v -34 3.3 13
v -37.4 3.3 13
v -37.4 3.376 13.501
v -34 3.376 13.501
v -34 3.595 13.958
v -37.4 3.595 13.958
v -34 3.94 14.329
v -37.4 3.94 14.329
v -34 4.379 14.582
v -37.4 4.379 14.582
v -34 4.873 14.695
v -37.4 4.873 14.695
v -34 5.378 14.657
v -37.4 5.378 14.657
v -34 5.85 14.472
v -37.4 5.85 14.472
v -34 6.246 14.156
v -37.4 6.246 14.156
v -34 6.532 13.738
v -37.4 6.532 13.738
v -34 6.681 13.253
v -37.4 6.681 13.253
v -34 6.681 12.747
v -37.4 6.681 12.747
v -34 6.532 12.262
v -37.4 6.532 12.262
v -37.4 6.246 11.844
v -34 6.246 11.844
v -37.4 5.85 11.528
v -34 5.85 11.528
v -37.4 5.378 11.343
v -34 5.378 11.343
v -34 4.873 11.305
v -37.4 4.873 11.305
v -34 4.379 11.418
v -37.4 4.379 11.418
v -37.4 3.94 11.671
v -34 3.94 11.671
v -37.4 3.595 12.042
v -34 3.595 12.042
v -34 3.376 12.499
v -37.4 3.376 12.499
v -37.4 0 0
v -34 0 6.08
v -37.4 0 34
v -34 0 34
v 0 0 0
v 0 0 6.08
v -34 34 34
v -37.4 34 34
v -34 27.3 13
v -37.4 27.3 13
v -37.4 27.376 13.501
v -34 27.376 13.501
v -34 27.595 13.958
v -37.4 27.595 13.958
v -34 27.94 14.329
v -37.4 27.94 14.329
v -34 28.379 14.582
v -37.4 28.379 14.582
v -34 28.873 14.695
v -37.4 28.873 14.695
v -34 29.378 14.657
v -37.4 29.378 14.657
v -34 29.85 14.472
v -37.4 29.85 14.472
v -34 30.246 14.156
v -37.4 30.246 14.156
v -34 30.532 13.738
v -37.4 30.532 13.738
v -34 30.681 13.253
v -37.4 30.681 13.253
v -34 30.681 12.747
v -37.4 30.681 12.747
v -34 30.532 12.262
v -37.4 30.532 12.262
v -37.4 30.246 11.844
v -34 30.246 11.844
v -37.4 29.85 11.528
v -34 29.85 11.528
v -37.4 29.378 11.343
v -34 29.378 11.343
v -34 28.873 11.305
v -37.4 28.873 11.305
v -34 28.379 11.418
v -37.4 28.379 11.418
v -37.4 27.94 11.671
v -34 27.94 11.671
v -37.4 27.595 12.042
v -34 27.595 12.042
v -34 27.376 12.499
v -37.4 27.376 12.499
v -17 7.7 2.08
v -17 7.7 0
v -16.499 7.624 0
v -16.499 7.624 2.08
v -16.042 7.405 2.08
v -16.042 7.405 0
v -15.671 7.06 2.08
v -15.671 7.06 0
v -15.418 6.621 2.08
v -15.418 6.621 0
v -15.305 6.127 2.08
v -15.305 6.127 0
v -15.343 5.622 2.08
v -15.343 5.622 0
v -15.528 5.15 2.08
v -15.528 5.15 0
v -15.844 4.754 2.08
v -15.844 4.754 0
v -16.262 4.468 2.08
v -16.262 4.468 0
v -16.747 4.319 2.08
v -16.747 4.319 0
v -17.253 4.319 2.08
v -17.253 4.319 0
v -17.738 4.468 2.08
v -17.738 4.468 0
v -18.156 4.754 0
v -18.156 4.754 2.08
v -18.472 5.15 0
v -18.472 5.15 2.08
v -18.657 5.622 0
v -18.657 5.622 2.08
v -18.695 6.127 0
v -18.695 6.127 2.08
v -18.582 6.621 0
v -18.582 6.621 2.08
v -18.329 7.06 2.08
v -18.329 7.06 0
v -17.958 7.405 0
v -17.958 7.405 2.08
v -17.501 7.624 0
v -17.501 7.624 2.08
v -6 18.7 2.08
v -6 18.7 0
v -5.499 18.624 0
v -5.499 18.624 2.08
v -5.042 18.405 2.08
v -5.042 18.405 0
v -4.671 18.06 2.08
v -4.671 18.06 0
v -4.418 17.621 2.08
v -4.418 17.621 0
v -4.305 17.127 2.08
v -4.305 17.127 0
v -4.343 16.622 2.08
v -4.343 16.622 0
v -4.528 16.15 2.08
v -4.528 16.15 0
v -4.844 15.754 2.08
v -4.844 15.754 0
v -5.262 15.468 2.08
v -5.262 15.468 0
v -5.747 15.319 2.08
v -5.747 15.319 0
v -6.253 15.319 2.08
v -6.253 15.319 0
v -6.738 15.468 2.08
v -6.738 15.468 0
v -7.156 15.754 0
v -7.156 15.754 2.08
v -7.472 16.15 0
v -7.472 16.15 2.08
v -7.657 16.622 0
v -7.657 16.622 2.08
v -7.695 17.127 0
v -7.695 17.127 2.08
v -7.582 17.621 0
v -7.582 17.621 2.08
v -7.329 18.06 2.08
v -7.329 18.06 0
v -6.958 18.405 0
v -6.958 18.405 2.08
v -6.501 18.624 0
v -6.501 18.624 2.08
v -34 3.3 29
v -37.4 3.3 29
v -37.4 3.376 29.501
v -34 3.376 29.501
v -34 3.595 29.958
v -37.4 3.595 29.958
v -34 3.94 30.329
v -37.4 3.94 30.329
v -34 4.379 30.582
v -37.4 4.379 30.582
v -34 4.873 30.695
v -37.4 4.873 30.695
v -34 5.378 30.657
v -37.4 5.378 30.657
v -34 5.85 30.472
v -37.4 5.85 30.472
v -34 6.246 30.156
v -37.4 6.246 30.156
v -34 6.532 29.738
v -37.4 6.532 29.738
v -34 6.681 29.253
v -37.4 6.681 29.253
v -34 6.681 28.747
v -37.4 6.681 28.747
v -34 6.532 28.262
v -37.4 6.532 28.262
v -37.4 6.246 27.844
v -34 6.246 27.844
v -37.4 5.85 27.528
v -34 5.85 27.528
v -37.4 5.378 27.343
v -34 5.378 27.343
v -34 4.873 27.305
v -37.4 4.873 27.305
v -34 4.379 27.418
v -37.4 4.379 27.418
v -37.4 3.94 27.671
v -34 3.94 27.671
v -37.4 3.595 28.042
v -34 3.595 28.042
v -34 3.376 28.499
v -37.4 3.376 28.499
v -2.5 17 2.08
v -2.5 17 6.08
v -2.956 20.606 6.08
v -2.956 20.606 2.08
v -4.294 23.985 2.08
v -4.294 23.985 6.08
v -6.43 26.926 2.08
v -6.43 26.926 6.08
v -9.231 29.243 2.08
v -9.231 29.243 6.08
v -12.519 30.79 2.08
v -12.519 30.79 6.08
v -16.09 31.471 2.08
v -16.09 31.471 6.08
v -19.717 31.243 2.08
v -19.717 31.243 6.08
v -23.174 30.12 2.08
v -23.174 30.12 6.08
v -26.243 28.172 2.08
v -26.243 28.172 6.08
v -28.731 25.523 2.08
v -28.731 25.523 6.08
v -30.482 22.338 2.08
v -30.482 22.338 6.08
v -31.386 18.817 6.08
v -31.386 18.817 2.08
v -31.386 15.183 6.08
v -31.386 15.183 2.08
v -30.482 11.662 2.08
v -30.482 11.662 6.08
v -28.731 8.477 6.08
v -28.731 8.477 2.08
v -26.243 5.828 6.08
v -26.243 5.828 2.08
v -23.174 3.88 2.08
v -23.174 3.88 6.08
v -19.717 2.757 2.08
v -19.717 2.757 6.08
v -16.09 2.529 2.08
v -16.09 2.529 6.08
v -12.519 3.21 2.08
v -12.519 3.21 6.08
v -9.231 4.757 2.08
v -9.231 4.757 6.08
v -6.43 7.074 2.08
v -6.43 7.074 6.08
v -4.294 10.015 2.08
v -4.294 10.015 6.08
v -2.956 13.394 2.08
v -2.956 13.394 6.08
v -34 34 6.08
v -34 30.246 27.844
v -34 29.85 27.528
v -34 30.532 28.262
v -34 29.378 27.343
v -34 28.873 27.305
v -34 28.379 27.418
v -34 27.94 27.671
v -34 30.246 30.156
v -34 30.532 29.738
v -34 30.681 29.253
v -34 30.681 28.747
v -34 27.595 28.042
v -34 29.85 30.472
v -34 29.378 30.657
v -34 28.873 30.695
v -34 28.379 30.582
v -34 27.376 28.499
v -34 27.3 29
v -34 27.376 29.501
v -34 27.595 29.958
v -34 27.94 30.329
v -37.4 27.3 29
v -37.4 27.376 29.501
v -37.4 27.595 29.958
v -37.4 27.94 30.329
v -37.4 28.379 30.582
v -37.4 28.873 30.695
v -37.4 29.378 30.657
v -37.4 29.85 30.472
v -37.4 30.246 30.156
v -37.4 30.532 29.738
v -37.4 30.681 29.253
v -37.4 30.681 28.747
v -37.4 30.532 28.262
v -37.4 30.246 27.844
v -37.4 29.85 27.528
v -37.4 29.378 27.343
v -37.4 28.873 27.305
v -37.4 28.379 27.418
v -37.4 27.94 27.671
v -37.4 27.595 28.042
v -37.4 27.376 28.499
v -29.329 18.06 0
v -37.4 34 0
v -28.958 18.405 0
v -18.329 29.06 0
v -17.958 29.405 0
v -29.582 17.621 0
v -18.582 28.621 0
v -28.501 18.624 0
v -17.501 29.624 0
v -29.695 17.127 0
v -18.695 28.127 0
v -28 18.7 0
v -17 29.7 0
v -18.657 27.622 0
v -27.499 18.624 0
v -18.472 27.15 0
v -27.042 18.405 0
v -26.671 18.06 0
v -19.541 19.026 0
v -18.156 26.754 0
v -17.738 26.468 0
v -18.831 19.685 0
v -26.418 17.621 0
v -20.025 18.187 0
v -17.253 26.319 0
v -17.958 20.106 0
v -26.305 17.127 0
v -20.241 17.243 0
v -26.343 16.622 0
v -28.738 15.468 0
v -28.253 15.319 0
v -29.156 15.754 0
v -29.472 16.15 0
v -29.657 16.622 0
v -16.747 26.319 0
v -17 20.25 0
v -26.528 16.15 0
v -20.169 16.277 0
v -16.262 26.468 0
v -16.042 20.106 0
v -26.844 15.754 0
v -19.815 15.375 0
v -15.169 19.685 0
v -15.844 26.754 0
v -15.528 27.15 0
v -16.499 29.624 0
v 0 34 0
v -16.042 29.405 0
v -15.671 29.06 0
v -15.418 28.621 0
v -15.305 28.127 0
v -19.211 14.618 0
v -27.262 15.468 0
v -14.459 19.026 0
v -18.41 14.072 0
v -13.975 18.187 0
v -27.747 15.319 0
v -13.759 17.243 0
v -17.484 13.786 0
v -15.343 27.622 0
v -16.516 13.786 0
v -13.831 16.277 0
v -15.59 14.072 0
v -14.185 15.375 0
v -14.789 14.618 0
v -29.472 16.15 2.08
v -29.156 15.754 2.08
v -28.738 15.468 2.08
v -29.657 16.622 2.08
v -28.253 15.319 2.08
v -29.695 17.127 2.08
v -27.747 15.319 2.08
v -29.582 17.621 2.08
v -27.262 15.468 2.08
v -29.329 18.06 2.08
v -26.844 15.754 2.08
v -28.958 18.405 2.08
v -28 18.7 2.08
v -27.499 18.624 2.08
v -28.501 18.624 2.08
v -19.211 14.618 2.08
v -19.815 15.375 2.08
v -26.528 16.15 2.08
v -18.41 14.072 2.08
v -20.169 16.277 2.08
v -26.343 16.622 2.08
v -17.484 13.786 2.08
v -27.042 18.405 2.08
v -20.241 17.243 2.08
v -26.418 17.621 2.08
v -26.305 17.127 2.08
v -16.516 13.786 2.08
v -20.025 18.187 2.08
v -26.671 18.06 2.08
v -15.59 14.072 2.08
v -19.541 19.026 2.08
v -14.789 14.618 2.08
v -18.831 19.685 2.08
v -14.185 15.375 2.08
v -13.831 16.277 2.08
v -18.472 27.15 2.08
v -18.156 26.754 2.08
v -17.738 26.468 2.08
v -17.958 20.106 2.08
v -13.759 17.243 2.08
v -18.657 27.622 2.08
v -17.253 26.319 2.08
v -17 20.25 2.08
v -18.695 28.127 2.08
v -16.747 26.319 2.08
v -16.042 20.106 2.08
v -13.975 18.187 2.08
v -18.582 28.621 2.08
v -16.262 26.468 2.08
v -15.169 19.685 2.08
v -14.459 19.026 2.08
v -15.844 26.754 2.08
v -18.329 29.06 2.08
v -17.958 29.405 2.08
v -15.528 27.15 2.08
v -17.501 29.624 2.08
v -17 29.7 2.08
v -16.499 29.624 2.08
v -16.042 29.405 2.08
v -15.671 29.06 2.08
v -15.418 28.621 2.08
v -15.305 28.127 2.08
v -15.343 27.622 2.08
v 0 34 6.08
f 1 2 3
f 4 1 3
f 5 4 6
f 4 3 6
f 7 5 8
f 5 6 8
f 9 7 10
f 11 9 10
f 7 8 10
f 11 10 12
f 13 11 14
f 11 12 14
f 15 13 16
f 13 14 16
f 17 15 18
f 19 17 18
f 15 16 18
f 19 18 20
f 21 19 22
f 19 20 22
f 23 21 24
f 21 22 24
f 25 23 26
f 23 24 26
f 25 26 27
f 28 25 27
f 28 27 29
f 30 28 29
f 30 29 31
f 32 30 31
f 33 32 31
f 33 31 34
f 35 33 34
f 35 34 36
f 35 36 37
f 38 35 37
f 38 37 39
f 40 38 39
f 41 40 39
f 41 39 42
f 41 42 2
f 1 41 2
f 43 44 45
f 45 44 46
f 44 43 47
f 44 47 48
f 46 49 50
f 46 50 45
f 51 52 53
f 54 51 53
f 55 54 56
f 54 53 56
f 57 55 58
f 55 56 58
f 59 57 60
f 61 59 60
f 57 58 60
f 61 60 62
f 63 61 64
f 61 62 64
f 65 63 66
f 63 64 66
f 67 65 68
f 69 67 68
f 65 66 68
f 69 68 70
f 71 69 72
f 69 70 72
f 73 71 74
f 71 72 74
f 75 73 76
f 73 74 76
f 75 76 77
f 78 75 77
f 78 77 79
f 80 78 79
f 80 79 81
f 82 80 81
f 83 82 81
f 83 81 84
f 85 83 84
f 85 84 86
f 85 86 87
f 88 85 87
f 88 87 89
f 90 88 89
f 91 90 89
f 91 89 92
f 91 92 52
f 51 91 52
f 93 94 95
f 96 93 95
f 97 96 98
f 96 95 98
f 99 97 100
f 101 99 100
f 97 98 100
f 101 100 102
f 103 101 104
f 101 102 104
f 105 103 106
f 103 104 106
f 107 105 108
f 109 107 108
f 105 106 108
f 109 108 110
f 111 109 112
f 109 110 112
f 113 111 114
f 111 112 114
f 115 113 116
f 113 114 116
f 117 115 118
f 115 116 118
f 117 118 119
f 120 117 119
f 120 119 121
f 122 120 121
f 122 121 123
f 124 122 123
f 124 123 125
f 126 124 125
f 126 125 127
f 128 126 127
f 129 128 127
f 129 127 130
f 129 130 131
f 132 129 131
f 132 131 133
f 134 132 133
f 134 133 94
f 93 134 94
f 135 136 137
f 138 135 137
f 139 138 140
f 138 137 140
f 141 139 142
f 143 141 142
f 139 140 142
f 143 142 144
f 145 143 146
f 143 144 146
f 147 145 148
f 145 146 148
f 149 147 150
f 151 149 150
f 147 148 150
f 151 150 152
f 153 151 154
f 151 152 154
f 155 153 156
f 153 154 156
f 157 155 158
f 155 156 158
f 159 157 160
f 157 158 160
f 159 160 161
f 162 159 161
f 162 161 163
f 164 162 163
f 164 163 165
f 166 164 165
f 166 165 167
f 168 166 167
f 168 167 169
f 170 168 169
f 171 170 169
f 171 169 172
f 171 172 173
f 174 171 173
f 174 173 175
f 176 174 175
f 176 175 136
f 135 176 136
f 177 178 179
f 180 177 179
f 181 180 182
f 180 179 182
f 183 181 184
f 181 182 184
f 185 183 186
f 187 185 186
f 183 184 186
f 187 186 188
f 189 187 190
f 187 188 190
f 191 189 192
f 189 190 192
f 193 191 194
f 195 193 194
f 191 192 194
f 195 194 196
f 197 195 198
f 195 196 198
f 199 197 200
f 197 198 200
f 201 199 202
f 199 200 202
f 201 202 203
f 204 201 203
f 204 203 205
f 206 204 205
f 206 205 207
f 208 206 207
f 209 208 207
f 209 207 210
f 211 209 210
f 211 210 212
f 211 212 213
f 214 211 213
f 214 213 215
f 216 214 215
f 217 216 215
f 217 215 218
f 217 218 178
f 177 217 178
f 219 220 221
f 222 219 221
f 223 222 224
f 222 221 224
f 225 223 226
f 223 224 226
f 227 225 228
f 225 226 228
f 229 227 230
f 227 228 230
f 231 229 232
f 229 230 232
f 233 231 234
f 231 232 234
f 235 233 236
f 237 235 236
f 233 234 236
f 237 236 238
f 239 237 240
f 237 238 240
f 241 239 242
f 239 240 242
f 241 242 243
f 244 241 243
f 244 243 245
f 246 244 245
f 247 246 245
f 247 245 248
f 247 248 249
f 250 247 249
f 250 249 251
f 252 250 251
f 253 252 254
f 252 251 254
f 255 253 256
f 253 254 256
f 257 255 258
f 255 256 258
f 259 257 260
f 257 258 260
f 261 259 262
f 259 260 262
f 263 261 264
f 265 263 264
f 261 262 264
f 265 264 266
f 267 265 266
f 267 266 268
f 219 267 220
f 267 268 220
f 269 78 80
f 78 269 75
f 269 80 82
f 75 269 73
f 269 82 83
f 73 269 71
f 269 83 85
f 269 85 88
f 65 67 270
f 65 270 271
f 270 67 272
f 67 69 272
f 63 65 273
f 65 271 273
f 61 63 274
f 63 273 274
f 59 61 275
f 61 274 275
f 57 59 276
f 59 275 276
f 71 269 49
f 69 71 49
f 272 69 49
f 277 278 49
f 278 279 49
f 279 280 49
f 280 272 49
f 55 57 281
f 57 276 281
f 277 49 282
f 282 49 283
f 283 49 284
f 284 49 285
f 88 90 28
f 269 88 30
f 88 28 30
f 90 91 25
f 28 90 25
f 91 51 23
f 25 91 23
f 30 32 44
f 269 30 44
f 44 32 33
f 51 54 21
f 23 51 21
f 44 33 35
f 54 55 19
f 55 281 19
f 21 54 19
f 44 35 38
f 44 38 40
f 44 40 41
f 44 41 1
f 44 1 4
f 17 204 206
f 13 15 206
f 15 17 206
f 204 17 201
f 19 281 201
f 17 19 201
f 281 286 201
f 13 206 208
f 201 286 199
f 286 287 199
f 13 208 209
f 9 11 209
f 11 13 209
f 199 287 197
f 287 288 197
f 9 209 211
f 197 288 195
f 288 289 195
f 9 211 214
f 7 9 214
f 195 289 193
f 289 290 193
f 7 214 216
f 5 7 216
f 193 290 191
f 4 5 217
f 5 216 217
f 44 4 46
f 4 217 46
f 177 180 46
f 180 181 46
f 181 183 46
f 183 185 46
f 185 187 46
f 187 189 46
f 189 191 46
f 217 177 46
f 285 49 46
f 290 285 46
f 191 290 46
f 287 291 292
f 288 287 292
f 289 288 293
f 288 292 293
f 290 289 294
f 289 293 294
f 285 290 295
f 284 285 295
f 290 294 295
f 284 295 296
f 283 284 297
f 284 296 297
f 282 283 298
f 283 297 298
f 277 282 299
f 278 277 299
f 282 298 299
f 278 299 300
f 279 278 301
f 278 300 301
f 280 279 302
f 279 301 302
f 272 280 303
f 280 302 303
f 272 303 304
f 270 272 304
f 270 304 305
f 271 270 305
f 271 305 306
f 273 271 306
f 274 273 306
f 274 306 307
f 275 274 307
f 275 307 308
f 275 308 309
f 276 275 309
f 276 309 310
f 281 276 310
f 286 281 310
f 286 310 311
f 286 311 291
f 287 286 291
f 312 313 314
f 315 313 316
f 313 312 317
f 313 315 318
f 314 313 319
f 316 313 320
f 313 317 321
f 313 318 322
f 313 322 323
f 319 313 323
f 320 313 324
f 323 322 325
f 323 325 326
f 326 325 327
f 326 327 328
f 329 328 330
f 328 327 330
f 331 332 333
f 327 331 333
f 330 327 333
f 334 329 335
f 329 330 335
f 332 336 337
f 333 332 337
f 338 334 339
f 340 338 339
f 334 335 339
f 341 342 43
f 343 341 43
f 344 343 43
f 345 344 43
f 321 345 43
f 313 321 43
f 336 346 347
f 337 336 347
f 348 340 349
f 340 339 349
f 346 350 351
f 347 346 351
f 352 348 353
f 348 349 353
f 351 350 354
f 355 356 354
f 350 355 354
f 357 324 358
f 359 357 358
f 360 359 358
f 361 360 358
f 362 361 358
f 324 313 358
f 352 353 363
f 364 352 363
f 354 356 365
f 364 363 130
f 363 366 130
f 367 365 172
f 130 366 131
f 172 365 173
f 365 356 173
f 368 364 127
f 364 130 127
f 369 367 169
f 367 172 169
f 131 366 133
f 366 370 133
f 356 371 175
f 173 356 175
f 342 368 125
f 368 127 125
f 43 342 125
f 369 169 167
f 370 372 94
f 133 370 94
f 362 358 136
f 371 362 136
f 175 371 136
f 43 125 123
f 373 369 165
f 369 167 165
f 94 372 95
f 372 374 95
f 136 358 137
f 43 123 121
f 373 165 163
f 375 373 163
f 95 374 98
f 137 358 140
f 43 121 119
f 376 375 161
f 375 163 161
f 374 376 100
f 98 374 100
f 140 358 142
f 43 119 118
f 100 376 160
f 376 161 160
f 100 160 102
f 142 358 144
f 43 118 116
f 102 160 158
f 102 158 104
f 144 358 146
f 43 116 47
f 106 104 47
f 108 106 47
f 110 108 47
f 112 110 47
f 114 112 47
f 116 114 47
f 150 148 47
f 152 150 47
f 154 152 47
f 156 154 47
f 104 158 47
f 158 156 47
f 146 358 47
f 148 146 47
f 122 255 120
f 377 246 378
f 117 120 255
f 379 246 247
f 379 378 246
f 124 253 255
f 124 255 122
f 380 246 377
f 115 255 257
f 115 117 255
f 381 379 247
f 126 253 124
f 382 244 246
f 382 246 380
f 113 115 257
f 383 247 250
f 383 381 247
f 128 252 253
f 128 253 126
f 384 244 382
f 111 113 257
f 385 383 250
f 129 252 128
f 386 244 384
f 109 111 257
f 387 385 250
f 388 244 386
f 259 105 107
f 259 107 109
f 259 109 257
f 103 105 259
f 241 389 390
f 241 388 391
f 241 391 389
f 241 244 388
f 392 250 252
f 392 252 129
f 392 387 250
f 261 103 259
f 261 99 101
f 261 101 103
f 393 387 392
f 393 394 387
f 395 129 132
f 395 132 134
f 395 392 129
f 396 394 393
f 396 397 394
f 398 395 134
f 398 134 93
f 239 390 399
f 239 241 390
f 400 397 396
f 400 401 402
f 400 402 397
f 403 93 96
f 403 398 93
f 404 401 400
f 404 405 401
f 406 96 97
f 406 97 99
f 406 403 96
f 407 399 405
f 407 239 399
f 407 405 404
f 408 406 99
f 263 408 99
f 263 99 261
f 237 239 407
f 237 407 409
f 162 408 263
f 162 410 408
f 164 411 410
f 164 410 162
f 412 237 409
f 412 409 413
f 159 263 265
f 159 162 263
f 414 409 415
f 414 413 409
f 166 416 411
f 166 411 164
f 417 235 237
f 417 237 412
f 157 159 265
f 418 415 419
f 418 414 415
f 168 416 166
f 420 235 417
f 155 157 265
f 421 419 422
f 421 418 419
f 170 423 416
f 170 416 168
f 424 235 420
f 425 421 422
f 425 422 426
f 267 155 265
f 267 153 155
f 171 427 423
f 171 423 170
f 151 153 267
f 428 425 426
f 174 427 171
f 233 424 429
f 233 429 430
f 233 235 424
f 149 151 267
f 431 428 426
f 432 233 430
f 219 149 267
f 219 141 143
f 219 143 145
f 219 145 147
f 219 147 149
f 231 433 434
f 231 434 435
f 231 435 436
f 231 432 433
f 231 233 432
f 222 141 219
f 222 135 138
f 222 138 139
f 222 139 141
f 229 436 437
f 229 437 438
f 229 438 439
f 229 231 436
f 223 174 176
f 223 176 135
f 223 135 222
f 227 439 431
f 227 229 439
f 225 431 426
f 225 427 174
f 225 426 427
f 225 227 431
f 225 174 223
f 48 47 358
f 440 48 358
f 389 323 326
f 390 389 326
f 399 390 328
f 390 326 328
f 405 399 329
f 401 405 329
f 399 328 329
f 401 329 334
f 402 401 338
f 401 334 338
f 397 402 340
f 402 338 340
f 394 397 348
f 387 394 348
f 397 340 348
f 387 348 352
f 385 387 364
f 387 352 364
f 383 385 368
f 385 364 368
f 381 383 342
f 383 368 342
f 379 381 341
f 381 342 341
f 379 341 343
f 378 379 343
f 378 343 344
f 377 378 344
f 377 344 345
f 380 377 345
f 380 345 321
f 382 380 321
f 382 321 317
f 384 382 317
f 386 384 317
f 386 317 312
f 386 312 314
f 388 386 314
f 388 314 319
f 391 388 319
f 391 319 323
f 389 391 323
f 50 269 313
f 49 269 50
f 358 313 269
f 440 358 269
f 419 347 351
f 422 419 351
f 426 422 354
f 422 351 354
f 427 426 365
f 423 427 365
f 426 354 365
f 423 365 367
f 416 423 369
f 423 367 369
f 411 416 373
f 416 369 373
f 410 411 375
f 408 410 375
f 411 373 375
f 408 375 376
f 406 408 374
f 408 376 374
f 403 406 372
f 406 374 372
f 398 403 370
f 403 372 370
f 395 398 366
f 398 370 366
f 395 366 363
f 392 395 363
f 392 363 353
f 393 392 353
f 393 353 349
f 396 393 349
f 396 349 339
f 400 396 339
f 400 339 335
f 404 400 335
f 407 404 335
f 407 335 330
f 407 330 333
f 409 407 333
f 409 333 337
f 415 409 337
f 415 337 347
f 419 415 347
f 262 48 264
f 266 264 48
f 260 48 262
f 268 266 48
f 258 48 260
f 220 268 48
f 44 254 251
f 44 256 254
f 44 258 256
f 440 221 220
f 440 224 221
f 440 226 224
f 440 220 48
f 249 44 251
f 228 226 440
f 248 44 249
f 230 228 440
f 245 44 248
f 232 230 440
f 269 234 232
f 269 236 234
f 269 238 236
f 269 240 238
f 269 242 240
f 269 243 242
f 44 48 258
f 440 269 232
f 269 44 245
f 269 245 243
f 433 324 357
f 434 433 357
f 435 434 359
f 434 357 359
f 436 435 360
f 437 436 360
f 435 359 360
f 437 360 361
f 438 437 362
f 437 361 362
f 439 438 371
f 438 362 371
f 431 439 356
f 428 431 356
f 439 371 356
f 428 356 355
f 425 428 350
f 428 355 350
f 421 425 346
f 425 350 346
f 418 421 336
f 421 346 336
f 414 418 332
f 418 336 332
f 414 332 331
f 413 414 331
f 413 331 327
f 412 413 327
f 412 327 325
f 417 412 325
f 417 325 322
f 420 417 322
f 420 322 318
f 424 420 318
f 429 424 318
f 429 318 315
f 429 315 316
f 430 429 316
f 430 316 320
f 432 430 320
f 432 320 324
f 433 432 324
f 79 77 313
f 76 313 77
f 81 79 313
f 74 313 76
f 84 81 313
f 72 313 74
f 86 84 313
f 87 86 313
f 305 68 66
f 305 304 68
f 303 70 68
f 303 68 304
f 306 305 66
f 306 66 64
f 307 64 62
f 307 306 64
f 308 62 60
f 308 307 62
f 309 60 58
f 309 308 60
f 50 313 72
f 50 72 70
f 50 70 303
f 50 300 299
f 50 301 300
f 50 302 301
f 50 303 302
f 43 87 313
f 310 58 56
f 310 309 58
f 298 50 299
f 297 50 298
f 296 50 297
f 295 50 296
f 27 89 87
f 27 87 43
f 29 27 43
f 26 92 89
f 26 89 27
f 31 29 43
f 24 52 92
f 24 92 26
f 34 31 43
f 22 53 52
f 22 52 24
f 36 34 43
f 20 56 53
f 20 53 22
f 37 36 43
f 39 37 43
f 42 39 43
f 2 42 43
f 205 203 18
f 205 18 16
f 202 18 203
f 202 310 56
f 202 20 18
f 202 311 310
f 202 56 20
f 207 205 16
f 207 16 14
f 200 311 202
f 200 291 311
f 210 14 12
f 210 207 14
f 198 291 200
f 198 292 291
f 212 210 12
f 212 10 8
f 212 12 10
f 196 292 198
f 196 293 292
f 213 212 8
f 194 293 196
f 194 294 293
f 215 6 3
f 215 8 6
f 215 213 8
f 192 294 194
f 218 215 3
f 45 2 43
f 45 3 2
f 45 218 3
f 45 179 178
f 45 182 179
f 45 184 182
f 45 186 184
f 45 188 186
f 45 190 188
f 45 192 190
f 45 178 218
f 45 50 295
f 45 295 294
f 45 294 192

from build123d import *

# Parameters (mm, degrees)
SKETCH1_W            = 34
SKETCH1_H            = 34
BOSS_EXTRUDE1_DEPTH  = 6.08
SKETCH2_W            = 34
SKETCH2_H            = 34
BOSS_EXTRUDE2_DEPTH  = 3.4
HOLE1_D              = 3.4
SKETCH5_R            = 14.5
CUT_EXTRUDE1_DEPTH   = 4
M3_CLEARANCE_HOLE1_D = 3.4
HOLE2_D              = 6.5


with BuildPart() as part:
    # Sketch1 → Boss-Extrude1 (new body)
    with BuildSketch(Plane(origin=(0, 0, 0), x_dir=(0, 1, 0), z_dir=(0, 0, 1))):
        with Locations((17, 17)):
            Rectangle(SKETCH1_W, SKETCH1_H)
    extrude(amount=BOSS_EXTRUDE1_DEPTH)

    # Sketch2 → Boss-Extrude2 (add)
    with BuildSketch(Plane(origin=(-34, 0, 0), x_dir=(0, -1, 0), z_dir=(-1, 0, 0))):
        with Locations((-17, 17)):
            Rectangle(SKETCH2_W, SKETCH2_H)
    extrude(amount=BOSS_EXTRUDE2_DEPTH)

    # Hole1 (through all)
    with Locations(Plane.YZ.offset(-34)):
        with Locations((5, 29), (29, 29), (5, 13), (29, 13)):
            Hole(HOLE1_D / 2)

    # Sketch5 → Cut-Extrude1 (cut)
    with BuildSketch(Plane.XY.offset(6.08)):
        with Locations((-17, 17)):
            Circle(SKETCH5_R)
    extrude(amount=-CUT_EXTRUDE1_DEPTH, mode=Mode.SUBTRACT)

    # M3 Clearance Hole1 (through all)
    with Locations(Plane(origin=(0, 0, 2.08), x_dir=(0, -1, 0), z_dir=(0, 0, 1))):
        with Locations((-17, -6), (-6, -17), (-17, -28), (-28, -17)):
            Hole(M3_CLEARANCE_HOLE1_D / 2)

    # Hole2 (through all)
    with Locations(Plane(origin=(0, 0, 2.08), x_dir=(0, -1, 0), z_dir=(0, 0, 1))):
        with Locations((-17, -17)):
            Hole(HOLE2_D / 2)


solid = part.part
